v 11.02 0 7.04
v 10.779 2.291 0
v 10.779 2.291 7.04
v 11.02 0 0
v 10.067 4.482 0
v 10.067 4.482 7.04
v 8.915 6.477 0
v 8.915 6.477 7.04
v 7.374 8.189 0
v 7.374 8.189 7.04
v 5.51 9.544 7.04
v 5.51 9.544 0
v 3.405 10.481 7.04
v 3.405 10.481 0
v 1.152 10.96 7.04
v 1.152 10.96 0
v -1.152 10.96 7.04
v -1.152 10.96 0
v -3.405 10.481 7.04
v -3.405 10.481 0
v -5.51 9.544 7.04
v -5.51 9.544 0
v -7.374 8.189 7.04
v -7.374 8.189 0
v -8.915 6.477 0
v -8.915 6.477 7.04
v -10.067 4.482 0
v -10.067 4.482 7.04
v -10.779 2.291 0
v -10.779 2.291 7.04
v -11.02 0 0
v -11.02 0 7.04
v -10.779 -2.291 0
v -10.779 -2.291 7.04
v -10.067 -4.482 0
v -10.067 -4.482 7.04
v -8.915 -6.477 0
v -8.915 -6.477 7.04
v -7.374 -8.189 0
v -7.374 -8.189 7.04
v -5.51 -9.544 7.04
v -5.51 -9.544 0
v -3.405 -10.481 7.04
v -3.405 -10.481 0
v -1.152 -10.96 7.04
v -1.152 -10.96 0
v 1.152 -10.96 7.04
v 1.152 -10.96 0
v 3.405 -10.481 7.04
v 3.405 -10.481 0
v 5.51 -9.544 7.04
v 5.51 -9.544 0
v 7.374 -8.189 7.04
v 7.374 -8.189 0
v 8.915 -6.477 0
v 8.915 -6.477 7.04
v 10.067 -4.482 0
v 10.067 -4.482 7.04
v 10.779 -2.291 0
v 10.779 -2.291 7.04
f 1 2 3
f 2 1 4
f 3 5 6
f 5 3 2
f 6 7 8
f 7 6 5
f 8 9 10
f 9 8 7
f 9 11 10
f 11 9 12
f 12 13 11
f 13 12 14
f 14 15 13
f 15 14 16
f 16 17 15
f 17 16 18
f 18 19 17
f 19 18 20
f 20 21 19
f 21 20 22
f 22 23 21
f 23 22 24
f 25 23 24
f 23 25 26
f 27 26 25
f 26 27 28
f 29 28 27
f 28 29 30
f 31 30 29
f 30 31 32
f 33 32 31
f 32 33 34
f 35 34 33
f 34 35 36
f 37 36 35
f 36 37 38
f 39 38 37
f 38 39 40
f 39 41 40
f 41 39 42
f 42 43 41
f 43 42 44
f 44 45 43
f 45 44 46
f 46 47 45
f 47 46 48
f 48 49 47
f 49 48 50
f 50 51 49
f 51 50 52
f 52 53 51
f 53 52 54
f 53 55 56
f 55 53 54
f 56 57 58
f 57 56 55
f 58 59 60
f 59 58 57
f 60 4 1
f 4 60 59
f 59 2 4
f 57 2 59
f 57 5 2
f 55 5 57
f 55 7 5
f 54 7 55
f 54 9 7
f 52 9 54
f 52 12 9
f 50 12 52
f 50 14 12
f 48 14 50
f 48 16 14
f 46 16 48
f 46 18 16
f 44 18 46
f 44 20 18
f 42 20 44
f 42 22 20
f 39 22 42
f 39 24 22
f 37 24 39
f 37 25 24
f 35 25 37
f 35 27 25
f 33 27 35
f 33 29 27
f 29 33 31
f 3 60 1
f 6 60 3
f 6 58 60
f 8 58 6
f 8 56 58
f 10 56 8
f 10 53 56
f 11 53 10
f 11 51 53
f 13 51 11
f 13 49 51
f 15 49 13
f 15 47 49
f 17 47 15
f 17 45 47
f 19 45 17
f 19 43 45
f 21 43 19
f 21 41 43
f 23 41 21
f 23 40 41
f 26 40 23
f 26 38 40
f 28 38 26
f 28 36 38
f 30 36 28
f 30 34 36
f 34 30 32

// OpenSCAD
// file: Vitamins/Zrod.scad
function ZrodLength()=1000;
function ZrodDiameter()=8;  //base case: 8
function ZrodRadius()=ZrodDiameter()/2;

module Zrod()
{
color("Silver")
cylinder(ZrodLength(), ZrodRadius(), ZrodRadius());
}

Zrod();
// file: Parameters.scad
use<Vitamins/Zrod.scad>

function mm(i) = i*25.4; 

//Build dimensions (x,y,z)-- x, y and z of printable area, NOT of overall device

//z-rod length, diameter-- dependent on which rods you buy
//(bearing diameter is dependent on rod diameter)



function ZrodSpacing()=66;


//parametric of which hotend is being used (printerbot or bucha nozzle)

//stepper vs servo

//3 parameters (1 for each link) horizontal vs vertical

//paper is a parametric vitamin

//distance between link arms will be calculable based on radius of toolplate





//tolerances
function LaserCutTolerance() = .02;
function 3dPrinterTolerance() = .04;




//the equation used for plastic width, it can of course be changed
function PlasticWidth()= (ZrodDiameter()/2);
function SideWidth() = (ZrodDiameter()+PlasticWidth());
// file: Vitamins/BallBearing.scad
use <../Parameters.scad>

function BallBearingDiam() = 22 + 3dPrinterTolerance(); //USUALLY 22
function BallBearingHeight() = 7 + 3dPrinterTolerance(); //USUALLY 7
function BallBearingInnerDiam()= 8 + 3dPrinterTolerance(); //USUALLY 8

module BallBearing()
{
cylinder(BallBearingHeight(), BallBearingDiam()/2, BallBearingDiam()/2);
}


BallBearing();
// main file
use<Vitamins/BallBearing.scad>

module tester(){
	BallBearing();
}

tester();
